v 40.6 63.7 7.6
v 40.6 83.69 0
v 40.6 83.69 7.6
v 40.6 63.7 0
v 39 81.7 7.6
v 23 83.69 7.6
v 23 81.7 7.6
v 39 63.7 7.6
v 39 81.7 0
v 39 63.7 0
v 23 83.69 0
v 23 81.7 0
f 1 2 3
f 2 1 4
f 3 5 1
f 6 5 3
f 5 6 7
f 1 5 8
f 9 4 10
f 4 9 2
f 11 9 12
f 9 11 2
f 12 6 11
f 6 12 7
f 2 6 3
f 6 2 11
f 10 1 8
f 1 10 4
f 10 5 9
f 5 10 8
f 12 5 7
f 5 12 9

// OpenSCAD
// TPU corner locators for the iPhone 18 Pro Max, the soft parts that take up the play between the
// phone and the shell's bay. Upstream ships four per phone and they are, with the door's camera
// opening, the whole of what makes a door phone-specific.
//
// Print in TPU. They are deliberately a little thicker than the gap, so they go in with a squeeze
// and damp the phone rather than letting it rattle; upstream's do the same (its iPhone 15 Pro
// locator stands 1.81 mm proud of the phone corner into a 1.20 mm gap).

part = "camera-top";     // camera-top, camera-bottom, usb-top, usb-bottom, or all

phone_x = 78.0;          // iPhone 18 Pro Max
phone_y = 163.4;
bay_x   = 80.00;         // the stretched shell's bay
bay_y   = 166.18;
squeeze = 0.6;           // how far past the bay it stands before being pressed in
arm_x   = 16.0;          // how far the arms run along each edge of the phone
arm_y   = 18.0;
h       = 7.6;           // up the side of the phone, clear of the door's plate

px = phone_x / 2;
py = phone_y / 2;
ox = bay_x / 2 + squeeze;
oy = bay_y / 2 + squeeze;

// One corner, in the +x +y quadrant: the corner block with the phone's own corner taken out of it.
module corner() {
    difference() {
        translate([(px - arm_x + ox) / 2, (py - arm_y + oy) / 2, h / 2])
            cube([ox - px + arm_x, oy - py + arm_y, h], center = true);
        translate([px - 400, py - 400, -1]) cube([400, 400, h + 2]);
    }
}

module at(sx, sy) { mirror([sx < 0 ? 1 : 0, 0, 0]) mirror([0, sy < 0 ? 1 : 0, 0]) corner(); }

if (part == "camera-top")         at( 1,  1);
else if (part == "camera-bottom") at(-1,  1);
else if (part == "usb-top")       at( 1, -1);
else if (part == "usb-bottom")    at(-1, -1);
else { at(1,1); at(-1,1); at(1,-1); at(-1,-1); }
